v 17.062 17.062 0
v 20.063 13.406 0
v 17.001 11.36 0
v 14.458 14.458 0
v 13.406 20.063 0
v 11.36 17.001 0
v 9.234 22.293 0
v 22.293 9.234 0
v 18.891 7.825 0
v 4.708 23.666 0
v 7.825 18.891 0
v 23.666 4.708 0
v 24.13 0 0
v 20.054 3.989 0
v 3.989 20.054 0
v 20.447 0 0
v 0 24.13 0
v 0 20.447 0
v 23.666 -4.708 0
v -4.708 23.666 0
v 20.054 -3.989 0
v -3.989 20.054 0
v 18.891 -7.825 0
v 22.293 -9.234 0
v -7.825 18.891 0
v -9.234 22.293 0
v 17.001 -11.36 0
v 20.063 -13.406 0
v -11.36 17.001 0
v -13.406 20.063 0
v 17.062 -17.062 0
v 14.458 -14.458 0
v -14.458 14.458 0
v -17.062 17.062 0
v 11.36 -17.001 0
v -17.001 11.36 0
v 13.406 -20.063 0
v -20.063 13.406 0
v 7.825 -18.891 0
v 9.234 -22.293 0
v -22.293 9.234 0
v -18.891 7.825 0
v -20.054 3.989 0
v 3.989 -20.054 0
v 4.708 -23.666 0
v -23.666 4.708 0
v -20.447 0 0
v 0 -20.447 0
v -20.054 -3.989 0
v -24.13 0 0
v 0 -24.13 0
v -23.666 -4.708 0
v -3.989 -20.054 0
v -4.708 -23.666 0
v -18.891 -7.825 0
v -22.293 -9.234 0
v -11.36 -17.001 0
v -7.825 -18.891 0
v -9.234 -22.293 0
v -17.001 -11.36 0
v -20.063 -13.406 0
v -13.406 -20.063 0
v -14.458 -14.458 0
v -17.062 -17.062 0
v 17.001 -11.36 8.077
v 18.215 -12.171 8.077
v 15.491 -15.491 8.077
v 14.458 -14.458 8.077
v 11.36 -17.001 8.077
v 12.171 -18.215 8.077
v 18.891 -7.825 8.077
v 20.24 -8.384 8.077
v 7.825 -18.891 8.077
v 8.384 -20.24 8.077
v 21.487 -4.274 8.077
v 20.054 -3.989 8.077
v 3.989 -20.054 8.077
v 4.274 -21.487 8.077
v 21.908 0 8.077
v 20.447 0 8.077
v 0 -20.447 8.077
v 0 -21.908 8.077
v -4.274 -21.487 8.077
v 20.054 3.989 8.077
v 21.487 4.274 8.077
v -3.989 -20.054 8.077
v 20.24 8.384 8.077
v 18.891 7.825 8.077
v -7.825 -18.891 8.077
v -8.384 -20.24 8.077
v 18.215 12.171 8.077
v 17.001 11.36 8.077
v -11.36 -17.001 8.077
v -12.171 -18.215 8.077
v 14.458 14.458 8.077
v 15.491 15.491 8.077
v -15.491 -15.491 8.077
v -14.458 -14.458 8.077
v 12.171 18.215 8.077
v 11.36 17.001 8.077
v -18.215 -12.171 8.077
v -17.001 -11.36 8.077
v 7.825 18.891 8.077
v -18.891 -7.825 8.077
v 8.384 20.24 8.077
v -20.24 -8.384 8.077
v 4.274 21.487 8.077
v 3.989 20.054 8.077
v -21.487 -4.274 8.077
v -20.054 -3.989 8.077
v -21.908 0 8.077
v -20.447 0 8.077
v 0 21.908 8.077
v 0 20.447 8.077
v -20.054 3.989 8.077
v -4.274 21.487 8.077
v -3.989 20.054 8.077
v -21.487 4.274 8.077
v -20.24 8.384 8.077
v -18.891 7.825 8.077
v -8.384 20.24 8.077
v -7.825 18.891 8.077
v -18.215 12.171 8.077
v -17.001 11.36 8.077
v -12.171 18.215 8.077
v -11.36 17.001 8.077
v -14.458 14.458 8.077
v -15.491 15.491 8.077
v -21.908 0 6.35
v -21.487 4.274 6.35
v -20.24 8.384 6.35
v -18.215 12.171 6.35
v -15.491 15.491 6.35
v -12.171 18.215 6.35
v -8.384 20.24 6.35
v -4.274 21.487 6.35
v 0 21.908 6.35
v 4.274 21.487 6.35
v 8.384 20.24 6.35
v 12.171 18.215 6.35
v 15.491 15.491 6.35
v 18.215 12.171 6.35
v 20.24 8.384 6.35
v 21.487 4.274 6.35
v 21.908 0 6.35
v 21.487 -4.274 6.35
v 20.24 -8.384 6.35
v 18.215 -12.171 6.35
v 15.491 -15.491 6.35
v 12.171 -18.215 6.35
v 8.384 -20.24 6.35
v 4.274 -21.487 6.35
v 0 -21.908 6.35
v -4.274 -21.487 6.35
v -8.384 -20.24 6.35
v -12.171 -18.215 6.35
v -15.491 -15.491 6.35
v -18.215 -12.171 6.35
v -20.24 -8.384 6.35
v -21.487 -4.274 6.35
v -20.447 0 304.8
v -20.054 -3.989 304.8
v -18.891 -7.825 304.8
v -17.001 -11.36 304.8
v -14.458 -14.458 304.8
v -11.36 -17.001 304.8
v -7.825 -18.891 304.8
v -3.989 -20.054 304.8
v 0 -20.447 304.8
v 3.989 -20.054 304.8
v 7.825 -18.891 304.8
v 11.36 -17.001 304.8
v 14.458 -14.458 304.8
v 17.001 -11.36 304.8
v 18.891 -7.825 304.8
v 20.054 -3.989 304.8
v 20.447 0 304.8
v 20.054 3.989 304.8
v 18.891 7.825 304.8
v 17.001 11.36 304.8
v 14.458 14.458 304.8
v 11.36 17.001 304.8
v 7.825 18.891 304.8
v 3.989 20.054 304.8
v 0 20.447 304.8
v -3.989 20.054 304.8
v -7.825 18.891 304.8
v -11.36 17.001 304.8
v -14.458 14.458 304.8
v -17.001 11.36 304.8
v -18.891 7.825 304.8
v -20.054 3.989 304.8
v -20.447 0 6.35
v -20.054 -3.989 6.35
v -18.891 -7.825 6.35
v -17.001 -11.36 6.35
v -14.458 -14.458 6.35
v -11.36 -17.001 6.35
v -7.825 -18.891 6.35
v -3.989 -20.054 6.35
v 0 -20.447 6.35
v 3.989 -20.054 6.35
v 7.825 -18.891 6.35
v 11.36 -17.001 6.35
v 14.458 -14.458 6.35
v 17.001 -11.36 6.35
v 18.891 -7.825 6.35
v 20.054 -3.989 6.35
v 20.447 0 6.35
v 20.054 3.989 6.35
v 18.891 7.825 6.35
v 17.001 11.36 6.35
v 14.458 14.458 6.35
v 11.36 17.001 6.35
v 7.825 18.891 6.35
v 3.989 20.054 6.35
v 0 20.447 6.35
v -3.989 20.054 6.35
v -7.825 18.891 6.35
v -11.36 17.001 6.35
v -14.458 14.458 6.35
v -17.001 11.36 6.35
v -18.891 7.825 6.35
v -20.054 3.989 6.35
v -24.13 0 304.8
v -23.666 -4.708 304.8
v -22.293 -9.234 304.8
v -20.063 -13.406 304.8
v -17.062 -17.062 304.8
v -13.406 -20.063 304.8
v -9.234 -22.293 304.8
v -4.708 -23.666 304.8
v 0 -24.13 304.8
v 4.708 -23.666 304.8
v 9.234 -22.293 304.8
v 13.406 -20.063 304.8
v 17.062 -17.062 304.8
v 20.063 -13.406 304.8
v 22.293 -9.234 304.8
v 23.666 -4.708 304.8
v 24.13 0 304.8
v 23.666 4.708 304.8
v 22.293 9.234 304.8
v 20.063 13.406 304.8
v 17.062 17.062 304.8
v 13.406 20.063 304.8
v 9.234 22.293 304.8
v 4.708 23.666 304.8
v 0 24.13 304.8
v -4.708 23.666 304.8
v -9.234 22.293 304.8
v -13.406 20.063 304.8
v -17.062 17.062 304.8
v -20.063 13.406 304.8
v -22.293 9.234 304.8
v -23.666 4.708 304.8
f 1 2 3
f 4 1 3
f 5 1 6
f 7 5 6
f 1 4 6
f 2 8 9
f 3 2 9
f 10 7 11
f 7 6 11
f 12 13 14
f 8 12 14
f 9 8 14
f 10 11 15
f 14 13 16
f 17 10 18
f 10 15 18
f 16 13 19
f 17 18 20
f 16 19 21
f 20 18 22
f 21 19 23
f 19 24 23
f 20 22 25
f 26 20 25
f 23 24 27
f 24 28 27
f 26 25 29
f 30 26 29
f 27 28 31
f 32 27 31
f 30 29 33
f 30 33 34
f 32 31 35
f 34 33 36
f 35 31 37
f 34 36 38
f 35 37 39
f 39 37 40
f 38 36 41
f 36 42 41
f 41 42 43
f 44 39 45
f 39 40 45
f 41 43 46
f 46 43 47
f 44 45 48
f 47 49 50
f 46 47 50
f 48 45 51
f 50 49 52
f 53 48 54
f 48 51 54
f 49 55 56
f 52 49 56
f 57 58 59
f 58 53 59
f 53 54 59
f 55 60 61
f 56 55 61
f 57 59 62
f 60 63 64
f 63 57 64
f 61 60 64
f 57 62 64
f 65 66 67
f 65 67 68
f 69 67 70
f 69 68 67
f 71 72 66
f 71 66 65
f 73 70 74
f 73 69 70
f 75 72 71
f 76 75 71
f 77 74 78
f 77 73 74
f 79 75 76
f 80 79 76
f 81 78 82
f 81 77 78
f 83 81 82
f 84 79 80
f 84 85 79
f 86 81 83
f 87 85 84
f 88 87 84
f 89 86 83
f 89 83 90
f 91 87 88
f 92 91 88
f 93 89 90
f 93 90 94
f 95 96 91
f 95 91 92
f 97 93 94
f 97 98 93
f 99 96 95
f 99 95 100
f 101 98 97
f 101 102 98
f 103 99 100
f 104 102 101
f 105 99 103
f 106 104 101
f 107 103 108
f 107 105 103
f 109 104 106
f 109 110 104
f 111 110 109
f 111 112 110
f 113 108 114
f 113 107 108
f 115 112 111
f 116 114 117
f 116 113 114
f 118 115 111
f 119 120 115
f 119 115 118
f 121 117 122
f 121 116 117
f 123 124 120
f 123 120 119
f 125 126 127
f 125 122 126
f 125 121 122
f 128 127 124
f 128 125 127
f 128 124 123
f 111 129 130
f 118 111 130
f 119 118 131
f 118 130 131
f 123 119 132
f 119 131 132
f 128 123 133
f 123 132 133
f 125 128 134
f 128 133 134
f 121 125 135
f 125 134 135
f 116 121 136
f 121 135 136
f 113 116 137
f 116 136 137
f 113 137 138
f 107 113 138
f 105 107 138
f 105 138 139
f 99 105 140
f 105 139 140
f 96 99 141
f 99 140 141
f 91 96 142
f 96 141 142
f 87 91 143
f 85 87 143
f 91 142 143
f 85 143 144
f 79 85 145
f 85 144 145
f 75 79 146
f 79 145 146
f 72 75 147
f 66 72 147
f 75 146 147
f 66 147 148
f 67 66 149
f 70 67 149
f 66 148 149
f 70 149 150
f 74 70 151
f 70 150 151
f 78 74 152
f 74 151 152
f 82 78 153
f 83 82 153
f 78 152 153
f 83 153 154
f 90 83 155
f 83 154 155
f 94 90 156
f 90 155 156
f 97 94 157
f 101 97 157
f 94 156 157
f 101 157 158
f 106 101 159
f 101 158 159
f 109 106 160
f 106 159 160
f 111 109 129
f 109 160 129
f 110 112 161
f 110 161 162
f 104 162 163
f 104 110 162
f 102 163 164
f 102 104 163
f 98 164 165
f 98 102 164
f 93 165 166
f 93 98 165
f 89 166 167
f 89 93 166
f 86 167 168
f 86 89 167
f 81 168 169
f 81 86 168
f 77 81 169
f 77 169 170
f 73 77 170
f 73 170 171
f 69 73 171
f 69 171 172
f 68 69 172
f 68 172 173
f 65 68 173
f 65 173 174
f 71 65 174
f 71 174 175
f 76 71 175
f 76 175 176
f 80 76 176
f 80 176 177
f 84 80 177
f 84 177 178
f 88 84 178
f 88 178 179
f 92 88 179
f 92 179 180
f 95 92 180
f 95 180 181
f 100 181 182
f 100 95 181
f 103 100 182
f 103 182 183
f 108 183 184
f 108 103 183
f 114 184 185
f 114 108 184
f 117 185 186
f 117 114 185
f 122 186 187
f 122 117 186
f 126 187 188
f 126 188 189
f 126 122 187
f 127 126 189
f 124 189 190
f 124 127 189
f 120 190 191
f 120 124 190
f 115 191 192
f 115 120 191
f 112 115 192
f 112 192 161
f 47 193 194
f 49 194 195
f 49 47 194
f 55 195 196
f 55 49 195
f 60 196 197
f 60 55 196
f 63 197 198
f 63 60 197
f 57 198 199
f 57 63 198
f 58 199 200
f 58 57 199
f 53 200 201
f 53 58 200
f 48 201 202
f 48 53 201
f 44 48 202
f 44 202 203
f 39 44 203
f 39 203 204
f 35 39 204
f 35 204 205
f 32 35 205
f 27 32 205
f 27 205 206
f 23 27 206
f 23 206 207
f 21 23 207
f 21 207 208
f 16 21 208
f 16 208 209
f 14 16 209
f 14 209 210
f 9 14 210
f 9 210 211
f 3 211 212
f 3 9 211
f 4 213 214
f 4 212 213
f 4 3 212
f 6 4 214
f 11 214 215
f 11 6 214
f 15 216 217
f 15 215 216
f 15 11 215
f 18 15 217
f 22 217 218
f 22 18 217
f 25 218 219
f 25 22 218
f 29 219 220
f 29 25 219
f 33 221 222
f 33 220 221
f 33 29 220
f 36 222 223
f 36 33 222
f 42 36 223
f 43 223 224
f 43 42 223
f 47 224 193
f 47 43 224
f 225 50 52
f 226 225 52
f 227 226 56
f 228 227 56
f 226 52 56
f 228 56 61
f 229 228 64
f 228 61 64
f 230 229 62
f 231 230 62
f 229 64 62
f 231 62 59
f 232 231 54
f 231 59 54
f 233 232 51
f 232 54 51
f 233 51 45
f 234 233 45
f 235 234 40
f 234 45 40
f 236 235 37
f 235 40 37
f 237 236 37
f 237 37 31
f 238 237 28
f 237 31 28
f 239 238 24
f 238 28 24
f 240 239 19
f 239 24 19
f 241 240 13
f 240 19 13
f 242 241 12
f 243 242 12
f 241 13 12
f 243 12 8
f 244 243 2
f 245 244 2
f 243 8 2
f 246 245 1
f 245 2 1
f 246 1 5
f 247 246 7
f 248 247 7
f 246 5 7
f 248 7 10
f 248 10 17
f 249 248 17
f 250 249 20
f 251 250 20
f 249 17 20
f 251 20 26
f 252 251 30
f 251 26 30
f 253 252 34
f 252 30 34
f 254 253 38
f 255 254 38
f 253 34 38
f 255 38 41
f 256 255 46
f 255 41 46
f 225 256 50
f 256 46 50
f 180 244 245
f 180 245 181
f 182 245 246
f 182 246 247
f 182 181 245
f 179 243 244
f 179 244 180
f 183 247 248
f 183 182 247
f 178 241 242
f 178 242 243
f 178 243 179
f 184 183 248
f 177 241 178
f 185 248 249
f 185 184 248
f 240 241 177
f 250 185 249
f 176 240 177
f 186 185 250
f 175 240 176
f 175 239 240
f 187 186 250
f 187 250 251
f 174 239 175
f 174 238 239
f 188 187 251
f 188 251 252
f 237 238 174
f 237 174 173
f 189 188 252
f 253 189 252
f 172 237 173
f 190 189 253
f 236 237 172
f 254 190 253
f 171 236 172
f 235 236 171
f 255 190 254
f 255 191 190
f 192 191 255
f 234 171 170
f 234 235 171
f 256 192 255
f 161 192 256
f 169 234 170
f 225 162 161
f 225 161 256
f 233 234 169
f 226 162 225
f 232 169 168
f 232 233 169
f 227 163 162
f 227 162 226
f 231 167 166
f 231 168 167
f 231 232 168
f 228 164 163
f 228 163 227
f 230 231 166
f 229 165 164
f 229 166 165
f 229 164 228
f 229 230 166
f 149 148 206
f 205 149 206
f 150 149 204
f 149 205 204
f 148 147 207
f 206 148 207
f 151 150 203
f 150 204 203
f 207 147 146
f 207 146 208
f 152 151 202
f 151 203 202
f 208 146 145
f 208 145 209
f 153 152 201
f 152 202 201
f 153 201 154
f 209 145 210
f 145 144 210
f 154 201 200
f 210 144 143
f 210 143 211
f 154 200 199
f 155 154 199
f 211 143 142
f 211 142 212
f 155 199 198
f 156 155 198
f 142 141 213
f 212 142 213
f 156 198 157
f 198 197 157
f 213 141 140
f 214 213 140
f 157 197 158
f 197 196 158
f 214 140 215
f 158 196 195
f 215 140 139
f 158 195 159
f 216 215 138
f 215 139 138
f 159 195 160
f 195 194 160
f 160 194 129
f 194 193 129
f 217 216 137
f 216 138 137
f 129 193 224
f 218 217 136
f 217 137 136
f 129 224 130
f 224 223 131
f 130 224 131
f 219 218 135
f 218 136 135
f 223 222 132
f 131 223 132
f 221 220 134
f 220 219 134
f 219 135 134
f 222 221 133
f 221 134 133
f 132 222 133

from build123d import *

# Parameters (mm, degrees)
SKETCH2_R              = 24.13
SKETCH2_R_2            = 20.447
BASE_DEPTH             = 304.8
SNAP_RING_GROOVE_START = -6.35
SKETCH3_R              = 21.9075
SKETCH3_R_2            = 20.447
SNAP_RING_GROOVE_DEPTH = 1.7272


with BuildPart() as part:
    # Sketch2 → base (new body)
    with BuildSketch(Plane(origin=(0, 0, 0), x_dir=(0, 1, 0), z_dir=(0, 0, 1))):
        with Locations(Location((0, 0, 0), (0, 0, 90))):
            Circle(SKETCH2_R)
        with Locations(Location((0, 0, 0), (0, 0, 90))):
            Circle(SKETCH2_R_2, mode=Mode.SUBTRACT)
    extrude(amount=BASE_DEPTH)

    # Sketch3 → snap_ring_groove (cut)
    with BuildSketch(Plane(origin=(0, 0, 0), x_dir=(1, 0, 0), z_dir=(0, 0, -1)).offset(SNAP_RING_GROOVE_START)):
        with Locations(Location((0, 0, 0), (0, 0, 180))):
            Circle(SKETCH3_R)
        with Locations(Location((0, 0, 0), (0, 0, 180))):
            Circle(SKETCH3_R_2, mode=Mode.SUBTRACT)
    extrude(amount=-SNAP_RING_GROOVE_DEPTH, mode=Mode.SUBTRACT)


solid = part.part
